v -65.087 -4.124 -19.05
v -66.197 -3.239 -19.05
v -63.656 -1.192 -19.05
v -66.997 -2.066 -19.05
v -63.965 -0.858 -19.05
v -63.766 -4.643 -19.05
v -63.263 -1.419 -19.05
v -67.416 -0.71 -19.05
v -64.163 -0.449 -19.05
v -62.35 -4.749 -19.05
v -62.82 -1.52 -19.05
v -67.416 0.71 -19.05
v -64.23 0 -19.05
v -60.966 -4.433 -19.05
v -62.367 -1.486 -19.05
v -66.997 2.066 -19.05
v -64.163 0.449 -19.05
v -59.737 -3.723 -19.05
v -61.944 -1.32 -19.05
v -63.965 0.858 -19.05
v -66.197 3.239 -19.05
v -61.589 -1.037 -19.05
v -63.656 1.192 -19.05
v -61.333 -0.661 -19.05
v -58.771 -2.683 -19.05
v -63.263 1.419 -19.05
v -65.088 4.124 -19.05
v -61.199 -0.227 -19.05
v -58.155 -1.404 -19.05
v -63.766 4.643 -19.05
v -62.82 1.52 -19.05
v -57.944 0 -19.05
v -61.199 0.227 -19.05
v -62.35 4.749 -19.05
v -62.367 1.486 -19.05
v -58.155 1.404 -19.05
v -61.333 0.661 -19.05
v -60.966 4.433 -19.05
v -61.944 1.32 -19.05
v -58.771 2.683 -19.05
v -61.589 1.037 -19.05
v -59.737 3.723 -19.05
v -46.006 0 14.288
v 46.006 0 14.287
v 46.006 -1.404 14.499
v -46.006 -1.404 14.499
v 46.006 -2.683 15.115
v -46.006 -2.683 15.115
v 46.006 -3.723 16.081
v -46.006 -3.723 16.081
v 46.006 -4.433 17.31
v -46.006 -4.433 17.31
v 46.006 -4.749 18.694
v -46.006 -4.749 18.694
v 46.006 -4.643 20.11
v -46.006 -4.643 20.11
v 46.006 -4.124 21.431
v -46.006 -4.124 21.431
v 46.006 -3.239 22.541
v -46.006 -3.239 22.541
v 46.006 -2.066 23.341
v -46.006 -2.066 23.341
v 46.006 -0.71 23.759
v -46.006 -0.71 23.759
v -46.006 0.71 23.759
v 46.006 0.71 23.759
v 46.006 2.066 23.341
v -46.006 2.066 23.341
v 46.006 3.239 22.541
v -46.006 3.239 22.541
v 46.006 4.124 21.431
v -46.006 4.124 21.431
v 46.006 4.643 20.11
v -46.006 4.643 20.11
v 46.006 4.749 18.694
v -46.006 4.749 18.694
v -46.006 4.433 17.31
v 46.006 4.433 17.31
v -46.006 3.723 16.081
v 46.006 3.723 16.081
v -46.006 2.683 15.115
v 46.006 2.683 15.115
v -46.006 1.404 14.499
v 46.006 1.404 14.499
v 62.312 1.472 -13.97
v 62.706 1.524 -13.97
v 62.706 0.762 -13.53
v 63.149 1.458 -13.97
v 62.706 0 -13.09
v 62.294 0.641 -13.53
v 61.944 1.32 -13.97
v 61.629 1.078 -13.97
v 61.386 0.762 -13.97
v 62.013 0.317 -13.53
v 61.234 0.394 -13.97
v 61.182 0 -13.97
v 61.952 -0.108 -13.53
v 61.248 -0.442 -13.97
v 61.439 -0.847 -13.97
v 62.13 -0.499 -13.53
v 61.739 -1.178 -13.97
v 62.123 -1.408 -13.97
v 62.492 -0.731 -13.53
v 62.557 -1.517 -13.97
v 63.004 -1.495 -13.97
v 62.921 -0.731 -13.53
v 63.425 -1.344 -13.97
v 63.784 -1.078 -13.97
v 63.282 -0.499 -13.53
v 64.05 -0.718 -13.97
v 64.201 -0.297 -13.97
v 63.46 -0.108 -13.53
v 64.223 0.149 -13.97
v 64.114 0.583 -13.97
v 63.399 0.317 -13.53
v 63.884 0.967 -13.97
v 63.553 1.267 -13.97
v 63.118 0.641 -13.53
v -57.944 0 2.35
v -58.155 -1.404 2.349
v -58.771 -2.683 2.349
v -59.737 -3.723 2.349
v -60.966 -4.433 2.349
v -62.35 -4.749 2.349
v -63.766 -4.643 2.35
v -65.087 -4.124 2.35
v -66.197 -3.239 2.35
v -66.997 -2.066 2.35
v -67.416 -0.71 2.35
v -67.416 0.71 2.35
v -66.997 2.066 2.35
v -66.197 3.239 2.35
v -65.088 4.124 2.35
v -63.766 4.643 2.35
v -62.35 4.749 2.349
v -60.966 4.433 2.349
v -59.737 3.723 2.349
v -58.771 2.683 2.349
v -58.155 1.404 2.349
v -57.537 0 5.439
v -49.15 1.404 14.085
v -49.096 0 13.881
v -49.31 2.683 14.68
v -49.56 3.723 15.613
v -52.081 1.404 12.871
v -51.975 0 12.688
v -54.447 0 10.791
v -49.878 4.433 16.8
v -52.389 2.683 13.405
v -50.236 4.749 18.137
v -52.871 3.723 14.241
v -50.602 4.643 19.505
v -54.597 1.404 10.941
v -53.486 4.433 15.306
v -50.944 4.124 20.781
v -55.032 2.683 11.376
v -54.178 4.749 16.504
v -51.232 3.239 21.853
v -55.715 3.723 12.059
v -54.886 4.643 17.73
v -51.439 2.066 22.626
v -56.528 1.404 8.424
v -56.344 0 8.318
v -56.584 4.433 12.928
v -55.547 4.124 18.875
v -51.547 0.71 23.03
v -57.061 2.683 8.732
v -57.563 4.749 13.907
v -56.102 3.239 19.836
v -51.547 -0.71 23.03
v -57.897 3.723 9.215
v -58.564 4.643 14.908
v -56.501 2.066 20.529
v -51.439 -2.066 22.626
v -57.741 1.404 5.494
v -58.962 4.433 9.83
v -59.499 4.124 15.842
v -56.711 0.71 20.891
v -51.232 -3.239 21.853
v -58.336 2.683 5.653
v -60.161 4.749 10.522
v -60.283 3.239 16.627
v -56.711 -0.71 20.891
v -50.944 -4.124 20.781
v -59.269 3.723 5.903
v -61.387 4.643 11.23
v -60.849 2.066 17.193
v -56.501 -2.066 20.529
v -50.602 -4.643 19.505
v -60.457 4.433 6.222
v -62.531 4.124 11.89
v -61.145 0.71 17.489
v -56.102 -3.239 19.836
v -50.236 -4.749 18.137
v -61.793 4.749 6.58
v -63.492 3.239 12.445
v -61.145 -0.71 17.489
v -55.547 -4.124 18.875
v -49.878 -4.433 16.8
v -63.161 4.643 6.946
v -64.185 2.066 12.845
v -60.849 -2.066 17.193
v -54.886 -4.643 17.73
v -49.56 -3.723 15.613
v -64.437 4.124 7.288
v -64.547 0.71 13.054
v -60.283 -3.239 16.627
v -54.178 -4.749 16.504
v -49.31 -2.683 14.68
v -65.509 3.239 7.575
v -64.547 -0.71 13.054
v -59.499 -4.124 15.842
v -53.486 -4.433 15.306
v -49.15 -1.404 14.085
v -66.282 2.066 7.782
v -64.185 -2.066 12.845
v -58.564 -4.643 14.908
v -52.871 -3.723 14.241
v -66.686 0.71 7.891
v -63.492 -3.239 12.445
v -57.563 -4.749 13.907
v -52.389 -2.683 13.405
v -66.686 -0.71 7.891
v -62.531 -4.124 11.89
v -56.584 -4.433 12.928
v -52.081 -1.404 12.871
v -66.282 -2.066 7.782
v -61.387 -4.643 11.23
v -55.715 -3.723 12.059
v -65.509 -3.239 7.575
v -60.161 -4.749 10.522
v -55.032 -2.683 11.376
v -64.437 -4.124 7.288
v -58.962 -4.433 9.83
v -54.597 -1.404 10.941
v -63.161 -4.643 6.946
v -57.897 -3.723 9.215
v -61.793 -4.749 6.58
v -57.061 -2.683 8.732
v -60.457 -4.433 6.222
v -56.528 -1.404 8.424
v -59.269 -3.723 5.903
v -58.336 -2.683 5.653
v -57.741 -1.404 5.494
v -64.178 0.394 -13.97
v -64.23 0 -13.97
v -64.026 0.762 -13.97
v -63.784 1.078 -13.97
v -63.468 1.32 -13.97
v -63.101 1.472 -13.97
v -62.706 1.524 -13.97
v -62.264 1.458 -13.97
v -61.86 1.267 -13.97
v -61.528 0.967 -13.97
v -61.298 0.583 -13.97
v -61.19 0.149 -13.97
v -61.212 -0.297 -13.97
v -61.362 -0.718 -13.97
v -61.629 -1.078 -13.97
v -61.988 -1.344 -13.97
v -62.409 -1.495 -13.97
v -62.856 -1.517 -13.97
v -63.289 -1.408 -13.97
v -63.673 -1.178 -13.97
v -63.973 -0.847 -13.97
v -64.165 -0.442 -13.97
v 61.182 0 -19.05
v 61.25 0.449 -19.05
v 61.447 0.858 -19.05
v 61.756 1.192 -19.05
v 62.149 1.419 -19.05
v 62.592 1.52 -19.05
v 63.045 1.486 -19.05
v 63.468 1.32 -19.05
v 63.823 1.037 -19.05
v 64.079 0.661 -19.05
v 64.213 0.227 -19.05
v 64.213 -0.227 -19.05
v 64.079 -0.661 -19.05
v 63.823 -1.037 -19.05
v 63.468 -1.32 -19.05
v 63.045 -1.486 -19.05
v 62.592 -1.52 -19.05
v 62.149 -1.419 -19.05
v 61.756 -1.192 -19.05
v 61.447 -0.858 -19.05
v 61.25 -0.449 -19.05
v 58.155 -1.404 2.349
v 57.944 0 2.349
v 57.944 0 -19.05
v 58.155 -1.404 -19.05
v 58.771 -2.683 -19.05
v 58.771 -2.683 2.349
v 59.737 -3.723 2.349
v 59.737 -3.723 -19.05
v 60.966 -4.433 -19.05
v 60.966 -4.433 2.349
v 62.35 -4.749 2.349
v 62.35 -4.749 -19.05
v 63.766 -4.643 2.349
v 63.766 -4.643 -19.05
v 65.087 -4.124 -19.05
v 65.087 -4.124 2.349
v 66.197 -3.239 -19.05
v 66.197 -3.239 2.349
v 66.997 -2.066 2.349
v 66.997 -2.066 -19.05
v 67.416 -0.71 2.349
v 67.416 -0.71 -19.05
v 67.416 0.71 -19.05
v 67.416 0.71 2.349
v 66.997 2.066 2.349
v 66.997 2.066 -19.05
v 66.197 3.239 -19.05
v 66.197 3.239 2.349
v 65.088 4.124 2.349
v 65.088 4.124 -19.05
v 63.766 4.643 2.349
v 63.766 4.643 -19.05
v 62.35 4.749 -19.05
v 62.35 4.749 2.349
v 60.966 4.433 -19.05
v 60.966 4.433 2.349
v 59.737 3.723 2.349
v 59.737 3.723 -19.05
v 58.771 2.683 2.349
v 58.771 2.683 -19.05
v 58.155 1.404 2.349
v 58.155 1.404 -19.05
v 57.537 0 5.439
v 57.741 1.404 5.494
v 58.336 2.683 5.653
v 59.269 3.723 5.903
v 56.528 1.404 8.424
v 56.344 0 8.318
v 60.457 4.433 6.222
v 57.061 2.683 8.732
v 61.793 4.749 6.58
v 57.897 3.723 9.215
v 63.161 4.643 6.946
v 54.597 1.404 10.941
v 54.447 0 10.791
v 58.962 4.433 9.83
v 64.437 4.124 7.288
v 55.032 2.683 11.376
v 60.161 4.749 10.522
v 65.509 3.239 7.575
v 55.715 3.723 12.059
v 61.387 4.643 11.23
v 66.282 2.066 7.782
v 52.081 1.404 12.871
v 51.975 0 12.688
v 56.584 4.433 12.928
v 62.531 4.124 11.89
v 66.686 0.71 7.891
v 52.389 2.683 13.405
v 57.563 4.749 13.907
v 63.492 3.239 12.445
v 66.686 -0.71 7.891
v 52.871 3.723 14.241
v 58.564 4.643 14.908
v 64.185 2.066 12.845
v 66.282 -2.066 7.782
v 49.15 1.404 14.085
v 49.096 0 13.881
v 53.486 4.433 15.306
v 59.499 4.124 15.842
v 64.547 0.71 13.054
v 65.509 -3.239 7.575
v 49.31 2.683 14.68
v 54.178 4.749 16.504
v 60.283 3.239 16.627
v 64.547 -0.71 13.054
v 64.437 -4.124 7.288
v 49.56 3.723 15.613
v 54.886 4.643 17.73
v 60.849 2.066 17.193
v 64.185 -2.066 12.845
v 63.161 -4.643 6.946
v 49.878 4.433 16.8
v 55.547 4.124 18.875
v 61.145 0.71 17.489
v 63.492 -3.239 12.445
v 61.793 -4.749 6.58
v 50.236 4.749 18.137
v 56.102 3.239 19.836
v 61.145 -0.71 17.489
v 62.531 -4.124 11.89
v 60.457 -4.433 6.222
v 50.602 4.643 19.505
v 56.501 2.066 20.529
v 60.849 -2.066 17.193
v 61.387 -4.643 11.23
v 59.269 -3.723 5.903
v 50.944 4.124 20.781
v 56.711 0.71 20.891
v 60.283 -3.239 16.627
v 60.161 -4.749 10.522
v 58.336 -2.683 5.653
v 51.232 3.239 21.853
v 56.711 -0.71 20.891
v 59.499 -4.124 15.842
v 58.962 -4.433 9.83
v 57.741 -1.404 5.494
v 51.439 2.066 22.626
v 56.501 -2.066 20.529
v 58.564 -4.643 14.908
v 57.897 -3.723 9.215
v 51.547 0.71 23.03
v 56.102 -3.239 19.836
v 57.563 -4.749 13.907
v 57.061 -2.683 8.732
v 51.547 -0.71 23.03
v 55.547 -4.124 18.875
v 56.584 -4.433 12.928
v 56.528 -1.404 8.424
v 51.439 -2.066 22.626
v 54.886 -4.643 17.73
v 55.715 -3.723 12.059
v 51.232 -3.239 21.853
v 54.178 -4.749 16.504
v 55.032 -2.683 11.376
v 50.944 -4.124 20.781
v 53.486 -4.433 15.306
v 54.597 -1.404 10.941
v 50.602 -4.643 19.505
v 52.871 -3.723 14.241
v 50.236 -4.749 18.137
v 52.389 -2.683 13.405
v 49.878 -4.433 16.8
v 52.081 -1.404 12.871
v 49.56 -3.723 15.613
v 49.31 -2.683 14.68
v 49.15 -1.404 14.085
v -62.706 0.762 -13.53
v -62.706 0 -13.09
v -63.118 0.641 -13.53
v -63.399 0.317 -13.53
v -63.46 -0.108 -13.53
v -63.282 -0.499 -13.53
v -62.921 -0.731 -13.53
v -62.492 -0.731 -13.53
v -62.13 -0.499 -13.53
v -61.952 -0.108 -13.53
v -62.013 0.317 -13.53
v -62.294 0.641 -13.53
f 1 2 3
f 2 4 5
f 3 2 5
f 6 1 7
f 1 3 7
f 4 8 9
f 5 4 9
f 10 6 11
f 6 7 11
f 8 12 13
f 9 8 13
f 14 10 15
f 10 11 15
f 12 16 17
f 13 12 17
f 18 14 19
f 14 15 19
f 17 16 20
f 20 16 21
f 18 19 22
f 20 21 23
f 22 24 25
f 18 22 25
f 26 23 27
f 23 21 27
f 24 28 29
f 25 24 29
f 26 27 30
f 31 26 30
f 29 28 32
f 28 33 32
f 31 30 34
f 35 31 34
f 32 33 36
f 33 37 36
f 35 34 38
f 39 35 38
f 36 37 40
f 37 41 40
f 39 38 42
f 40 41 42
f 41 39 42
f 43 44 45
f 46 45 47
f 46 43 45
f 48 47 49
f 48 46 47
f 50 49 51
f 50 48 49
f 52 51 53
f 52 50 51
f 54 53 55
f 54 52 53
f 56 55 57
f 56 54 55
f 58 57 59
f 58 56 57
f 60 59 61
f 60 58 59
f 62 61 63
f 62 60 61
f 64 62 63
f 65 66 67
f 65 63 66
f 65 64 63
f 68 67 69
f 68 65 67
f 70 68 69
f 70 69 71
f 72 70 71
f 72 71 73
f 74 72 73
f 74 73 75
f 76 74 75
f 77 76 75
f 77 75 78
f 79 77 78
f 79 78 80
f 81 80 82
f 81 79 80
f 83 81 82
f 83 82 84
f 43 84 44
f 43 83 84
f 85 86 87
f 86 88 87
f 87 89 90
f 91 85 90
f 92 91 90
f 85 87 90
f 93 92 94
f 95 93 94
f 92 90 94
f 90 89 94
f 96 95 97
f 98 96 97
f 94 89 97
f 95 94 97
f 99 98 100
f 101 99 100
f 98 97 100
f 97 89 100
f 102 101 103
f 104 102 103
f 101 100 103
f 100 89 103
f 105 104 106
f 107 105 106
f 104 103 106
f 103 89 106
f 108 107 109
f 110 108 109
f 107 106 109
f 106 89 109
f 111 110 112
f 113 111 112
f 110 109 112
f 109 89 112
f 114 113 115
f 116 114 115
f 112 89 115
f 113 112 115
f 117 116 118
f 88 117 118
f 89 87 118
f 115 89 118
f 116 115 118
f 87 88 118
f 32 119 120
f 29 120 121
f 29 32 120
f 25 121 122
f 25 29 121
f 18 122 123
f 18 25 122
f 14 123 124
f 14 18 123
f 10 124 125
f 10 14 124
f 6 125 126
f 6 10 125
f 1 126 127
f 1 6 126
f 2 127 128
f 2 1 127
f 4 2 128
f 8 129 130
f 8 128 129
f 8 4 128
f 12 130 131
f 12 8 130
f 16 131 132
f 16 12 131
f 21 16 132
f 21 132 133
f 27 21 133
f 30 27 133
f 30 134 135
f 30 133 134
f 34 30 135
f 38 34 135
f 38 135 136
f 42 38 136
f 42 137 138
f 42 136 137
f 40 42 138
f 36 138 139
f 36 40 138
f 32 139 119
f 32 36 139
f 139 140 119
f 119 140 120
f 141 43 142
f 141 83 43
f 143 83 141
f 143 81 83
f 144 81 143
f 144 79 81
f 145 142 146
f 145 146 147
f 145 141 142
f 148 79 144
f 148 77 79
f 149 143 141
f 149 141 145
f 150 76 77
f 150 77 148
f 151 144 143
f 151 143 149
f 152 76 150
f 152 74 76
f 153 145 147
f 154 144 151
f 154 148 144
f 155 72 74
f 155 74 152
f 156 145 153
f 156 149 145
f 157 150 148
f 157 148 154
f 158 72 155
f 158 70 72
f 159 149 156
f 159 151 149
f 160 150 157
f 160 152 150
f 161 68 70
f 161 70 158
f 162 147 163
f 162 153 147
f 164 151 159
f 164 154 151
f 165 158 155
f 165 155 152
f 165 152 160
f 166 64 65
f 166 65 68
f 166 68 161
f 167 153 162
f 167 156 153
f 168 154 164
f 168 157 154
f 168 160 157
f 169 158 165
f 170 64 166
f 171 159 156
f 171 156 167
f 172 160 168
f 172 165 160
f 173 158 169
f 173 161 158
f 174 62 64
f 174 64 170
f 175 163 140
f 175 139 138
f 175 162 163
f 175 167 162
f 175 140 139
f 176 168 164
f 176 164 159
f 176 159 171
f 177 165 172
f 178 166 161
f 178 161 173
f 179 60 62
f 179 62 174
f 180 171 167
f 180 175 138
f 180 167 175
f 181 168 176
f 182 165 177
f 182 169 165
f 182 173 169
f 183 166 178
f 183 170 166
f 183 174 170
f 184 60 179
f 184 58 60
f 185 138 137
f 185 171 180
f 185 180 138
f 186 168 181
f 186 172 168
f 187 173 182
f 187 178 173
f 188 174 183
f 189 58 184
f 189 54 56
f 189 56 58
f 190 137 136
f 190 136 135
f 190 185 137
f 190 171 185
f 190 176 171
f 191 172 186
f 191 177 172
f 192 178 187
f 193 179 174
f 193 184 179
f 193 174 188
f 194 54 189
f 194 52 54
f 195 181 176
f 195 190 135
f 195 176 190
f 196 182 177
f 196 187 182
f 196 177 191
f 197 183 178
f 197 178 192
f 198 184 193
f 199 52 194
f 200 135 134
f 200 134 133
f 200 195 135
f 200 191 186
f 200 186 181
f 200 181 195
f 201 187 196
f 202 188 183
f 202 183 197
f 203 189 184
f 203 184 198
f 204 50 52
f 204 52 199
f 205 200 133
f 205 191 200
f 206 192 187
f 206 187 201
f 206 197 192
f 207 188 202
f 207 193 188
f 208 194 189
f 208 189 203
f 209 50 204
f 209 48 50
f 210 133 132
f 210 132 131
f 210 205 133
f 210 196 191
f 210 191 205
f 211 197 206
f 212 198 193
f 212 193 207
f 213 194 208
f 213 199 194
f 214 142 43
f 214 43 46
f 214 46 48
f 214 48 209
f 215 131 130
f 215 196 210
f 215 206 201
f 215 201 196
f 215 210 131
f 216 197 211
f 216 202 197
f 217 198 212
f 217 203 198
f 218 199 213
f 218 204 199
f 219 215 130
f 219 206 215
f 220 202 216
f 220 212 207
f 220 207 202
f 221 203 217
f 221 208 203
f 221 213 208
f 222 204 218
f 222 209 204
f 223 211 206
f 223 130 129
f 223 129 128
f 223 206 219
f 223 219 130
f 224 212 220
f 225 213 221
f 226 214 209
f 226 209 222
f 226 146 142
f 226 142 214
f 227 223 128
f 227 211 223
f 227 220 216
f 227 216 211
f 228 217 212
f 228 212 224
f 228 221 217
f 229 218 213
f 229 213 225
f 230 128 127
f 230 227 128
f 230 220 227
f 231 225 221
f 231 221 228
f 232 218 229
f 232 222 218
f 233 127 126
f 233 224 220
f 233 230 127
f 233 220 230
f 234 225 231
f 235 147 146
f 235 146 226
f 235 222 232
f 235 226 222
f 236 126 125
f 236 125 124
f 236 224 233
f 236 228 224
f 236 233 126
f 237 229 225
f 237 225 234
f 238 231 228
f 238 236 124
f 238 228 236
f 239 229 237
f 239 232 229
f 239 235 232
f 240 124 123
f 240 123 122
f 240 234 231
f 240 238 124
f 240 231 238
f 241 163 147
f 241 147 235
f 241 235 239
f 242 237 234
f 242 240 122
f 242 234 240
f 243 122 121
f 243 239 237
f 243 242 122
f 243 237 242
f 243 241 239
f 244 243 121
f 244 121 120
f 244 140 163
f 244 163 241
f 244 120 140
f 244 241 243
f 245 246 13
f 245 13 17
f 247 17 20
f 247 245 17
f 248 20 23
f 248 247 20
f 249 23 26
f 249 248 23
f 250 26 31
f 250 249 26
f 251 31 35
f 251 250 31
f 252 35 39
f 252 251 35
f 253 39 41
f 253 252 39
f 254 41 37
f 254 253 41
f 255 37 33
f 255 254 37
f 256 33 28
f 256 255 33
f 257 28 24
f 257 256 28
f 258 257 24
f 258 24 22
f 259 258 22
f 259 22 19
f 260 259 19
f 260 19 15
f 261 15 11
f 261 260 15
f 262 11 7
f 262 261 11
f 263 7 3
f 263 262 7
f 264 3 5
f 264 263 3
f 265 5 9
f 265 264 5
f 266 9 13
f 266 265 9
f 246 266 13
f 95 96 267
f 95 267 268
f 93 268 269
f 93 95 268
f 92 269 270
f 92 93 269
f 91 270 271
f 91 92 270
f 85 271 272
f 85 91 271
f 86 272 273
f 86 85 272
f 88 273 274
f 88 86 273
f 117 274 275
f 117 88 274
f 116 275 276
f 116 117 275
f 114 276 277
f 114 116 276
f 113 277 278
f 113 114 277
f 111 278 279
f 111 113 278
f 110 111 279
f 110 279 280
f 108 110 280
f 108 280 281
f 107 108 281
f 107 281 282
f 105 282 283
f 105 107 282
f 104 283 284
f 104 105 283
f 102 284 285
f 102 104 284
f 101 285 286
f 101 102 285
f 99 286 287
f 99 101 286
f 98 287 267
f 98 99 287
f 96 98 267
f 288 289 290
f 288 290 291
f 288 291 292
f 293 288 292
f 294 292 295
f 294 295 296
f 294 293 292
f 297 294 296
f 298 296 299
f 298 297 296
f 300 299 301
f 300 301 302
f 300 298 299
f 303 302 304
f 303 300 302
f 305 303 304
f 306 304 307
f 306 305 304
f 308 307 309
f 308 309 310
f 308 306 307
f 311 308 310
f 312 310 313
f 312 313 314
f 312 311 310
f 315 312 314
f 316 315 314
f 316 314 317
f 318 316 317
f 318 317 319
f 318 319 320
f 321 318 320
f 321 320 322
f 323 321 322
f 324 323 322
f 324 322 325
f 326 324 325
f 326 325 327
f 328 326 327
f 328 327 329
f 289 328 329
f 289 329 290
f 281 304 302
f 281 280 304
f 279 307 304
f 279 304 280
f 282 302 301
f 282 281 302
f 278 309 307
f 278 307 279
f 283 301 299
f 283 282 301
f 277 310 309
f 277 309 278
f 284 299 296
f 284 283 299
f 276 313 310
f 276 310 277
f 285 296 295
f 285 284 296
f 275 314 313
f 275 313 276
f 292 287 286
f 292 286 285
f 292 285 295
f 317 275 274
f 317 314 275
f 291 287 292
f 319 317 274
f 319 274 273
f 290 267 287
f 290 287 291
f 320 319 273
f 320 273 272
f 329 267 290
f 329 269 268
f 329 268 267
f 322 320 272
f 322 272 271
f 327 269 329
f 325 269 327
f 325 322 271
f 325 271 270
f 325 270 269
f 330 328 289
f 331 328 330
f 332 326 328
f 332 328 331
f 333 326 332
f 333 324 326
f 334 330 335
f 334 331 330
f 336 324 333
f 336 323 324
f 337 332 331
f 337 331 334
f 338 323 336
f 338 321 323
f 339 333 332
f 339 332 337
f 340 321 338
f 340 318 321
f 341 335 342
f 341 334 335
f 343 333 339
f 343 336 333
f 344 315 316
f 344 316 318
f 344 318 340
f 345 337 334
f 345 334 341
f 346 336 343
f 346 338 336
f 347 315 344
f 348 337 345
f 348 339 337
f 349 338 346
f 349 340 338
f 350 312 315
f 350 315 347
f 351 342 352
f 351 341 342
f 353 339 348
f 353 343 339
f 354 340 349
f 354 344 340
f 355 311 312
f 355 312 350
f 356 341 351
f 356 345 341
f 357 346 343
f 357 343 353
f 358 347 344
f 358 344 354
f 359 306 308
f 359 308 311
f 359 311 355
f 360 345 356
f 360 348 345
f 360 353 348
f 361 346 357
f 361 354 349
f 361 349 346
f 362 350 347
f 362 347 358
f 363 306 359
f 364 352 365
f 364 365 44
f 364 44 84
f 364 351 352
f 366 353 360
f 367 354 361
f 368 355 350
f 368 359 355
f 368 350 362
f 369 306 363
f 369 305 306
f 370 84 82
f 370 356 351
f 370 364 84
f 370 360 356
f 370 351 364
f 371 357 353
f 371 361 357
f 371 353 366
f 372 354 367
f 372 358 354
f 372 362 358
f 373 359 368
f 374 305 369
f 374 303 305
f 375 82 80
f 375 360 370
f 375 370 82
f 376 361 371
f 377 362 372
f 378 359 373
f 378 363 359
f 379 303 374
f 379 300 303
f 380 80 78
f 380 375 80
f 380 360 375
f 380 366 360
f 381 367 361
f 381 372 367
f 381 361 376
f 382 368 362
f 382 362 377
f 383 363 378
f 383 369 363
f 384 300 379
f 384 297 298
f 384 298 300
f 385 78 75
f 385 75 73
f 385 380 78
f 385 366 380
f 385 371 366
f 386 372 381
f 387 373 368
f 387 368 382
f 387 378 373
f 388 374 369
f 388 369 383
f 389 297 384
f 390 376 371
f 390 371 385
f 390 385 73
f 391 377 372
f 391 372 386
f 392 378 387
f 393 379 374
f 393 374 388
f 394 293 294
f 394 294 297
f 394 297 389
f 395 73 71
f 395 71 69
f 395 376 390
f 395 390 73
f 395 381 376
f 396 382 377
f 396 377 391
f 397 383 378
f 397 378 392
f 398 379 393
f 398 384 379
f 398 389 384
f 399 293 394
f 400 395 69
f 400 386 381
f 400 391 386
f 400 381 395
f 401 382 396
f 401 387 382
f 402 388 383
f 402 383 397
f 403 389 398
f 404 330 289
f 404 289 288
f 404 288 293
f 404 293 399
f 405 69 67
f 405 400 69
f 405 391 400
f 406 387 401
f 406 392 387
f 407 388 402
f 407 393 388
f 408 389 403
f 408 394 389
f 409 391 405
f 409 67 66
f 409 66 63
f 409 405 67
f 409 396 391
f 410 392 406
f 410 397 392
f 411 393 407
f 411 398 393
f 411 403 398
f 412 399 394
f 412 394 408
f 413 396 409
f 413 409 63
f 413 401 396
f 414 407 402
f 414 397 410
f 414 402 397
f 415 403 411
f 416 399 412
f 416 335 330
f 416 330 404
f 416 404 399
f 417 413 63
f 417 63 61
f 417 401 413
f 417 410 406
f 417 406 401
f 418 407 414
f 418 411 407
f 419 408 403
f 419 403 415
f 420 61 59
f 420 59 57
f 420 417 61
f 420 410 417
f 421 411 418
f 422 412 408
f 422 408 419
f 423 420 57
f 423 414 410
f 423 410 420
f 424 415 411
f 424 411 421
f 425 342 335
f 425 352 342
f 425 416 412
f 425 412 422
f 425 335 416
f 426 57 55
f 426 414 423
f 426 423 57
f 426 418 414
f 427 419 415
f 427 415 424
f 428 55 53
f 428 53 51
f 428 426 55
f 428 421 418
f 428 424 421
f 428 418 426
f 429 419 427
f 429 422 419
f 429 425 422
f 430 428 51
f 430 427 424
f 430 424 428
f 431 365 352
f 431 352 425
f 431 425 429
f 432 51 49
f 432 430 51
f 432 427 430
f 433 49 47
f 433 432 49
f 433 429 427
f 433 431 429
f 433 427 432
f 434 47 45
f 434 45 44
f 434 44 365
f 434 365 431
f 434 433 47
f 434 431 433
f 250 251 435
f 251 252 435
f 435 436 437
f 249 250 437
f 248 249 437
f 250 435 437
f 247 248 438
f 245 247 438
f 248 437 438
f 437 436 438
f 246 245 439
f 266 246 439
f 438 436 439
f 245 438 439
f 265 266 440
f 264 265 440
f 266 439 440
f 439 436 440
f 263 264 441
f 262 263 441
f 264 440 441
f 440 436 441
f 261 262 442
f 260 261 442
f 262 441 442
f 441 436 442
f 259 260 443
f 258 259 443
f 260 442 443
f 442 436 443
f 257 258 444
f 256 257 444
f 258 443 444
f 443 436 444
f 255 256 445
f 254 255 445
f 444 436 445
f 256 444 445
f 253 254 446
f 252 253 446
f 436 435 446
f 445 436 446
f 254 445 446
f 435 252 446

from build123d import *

# Parameters (mm, degrees)
SKETCH2_R                     = 4.7625
LOCATION_START                = -5.08
SKETCH4_R                     = 1.524
LOCATION_HOLE_OTHER_WAY_DEPTH = 81.074387678


with BuildPart() as part:
    # Handle: sweep along a path in Sketch3
    with BuildLine(Plane(origin=(0, 0, 0), x_dir=(1, 0, 0), z_dir=(0, 1, 0))) as handle_path:
        Line((62.70625, 19.05), (62.70625, -2.3495))
        ThreePointArc((62.70625, -2.3495), (57.814786799, -14.158536799), (46.00575, -19.05))
        Line((46.00575, -19.05), (-46.00575, -19.05))
        ThreePointArc((-46.00575, -19.05), (-57.814786799, -14.158536799), (-62.70625, -2.3495))
        Line((-62.70625, -2.3495), (-62.70625, 19.05))
    # Sketch2 → Handle (sweep)
    with BuildSketch(Plane.XY.offset(-19.05)):
        with Locations((-62.70625, 0)):
            Circle(SKETCH2_R)
    sweep(path=handle_path.line)

    # Location Hole cone 1 section (through the dimple's axis) → Location Hole (revolve, cut)
    with BuildSketch(Plane(origin=(-62.70625, 0, -13.97), x_dir=(0, 1, 0), z_dir=(1, 0, 0))):
        Polygon((0, 0), (1.524, 0), (0, 0.87988181), align=None)
    revolve(axis=Axis((-62.70625, 0, -13.97), (0, 0, 1)), mode=Mode.SUBTRACT)

    # Location Hole cone 2 section (through the dimple's axis) → Location Hole cone 2 (revolve, cut)
    with BuildSketch(Plane(origin=(62.70625, 0, -13.97), x_dir=(0, 1, 0), z_dir=(1, 0, 0))):
        Polygon((0, 0), (1.524, 0), (0, 0.87988181), align=None)
    revolve(axis=Axis((62.70625, 0, -13.97), (0, 0, 1)), mode=Mode.SUBTRACT)

    # Sketch4 → Location Hole other way (cut)
    with BuildSketch(Plane(origin=(0, 0, -19.05), x_dir=(-1, 0, 0), z_dir=(0, 0, -1)).offset(LOCATION_START)):
        with Locations((62.70625, 0)):
            Circle(SKETCH4_R)
        with Locations((-62.70625, 0)):
            Circle(SKETCH4_R)
    extrude(amount=LOCATION_HOLE_OTHER_WAY_DEPTH, mode=Mode.SUBTRACT)


solid = part.part
